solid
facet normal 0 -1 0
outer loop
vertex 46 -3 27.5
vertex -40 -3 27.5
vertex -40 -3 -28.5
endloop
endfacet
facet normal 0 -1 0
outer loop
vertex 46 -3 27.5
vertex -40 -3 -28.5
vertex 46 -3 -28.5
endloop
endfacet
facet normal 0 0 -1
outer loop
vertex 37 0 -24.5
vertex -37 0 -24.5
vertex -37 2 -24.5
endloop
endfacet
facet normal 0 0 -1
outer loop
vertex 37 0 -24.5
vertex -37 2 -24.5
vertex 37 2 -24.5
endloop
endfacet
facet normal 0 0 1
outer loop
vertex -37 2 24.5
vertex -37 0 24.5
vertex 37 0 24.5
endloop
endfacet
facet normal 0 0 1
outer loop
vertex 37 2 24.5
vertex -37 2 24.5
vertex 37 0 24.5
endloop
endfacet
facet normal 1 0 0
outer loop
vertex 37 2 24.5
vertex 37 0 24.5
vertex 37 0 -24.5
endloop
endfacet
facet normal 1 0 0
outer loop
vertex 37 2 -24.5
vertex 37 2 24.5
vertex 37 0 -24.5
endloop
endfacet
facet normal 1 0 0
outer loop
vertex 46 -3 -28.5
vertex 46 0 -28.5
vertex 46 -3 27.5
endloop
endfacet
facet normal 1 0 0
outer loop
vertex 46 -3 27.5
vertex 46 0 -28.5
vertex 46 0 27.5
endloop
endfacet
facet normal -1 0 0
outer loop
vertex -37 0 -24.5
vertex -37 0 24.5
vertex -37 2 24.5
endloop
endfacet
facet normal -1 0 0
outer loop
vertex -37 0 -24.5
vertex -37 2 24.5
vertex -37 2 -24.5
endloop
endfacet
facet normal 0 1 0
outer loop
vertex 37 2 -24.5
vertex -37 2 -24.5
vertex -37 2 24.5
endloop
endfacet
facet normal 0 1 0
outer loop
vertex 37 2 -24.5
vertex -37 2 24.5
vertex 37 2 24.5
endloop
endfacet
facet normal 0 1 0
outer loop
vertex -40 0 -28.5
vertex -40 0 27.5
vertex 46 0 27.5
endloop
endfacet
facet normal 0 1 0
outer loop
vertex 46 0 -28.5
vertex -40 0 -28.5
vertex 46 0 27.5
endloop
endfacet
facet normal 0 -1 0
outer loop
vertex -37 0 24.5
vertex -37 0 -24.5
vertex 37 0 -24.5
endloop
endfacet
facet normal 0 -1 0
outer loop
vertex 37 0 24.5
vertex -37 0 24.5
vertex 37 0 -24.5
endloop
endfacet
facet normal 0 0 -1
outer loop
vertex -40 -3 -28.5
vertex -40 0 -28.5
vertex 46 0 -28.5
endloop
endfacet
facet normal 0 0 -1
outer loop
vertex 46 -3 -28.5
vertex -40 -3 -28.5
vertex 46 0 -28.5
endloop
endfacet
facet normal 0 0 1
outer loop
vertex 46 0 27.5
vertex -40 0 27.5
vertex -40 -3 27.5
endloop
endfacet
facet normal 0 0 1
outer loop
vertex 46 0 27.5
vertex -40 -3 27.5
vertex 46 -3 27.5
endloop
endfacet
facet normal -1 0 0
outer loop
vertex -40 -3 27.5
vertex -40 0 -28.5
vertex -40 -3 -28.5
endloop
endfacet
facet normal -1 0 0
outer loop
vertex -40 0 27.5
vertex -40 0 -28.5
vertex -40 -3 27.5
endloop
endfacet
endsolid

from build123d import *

# Parameters (mm, degrees)
SKETCH1_W           = 74
SKETCH1_H           = 49
BOSS_EXTRUDE1_DEPTH = 2
SKETCH2_W           = 86
SKETCH2_H           = 56
BOSS_EXTRUDE2_DEPTH = 3


with BuildPart() as part:
    # Sketch1 → Boss-Extrude1 (new body)
    with BuildSketch(Plane(origin=(0, 0, 0), x_dir=(1, 0, 0), z_dir=(0, 1, 0))):
        Rectangle(SKETCH1_W, SKETCH1_H)
    extrude(amount=BOSS_EXTRUDE1_DEPTH)


with BuildPart() as body_2:
    # Sketch2 → Boss-Extrude2 (new body)
    with BuildSketch(Plane.XZ):
        with Locations((3, -0.5)):
            Rectangle(SKETCH2_W, SKETCH2_H)
    extrude(amount=BOSS_EXTRUDE2_DEPTH)


solid = Compound([part.part, body_2.part])
